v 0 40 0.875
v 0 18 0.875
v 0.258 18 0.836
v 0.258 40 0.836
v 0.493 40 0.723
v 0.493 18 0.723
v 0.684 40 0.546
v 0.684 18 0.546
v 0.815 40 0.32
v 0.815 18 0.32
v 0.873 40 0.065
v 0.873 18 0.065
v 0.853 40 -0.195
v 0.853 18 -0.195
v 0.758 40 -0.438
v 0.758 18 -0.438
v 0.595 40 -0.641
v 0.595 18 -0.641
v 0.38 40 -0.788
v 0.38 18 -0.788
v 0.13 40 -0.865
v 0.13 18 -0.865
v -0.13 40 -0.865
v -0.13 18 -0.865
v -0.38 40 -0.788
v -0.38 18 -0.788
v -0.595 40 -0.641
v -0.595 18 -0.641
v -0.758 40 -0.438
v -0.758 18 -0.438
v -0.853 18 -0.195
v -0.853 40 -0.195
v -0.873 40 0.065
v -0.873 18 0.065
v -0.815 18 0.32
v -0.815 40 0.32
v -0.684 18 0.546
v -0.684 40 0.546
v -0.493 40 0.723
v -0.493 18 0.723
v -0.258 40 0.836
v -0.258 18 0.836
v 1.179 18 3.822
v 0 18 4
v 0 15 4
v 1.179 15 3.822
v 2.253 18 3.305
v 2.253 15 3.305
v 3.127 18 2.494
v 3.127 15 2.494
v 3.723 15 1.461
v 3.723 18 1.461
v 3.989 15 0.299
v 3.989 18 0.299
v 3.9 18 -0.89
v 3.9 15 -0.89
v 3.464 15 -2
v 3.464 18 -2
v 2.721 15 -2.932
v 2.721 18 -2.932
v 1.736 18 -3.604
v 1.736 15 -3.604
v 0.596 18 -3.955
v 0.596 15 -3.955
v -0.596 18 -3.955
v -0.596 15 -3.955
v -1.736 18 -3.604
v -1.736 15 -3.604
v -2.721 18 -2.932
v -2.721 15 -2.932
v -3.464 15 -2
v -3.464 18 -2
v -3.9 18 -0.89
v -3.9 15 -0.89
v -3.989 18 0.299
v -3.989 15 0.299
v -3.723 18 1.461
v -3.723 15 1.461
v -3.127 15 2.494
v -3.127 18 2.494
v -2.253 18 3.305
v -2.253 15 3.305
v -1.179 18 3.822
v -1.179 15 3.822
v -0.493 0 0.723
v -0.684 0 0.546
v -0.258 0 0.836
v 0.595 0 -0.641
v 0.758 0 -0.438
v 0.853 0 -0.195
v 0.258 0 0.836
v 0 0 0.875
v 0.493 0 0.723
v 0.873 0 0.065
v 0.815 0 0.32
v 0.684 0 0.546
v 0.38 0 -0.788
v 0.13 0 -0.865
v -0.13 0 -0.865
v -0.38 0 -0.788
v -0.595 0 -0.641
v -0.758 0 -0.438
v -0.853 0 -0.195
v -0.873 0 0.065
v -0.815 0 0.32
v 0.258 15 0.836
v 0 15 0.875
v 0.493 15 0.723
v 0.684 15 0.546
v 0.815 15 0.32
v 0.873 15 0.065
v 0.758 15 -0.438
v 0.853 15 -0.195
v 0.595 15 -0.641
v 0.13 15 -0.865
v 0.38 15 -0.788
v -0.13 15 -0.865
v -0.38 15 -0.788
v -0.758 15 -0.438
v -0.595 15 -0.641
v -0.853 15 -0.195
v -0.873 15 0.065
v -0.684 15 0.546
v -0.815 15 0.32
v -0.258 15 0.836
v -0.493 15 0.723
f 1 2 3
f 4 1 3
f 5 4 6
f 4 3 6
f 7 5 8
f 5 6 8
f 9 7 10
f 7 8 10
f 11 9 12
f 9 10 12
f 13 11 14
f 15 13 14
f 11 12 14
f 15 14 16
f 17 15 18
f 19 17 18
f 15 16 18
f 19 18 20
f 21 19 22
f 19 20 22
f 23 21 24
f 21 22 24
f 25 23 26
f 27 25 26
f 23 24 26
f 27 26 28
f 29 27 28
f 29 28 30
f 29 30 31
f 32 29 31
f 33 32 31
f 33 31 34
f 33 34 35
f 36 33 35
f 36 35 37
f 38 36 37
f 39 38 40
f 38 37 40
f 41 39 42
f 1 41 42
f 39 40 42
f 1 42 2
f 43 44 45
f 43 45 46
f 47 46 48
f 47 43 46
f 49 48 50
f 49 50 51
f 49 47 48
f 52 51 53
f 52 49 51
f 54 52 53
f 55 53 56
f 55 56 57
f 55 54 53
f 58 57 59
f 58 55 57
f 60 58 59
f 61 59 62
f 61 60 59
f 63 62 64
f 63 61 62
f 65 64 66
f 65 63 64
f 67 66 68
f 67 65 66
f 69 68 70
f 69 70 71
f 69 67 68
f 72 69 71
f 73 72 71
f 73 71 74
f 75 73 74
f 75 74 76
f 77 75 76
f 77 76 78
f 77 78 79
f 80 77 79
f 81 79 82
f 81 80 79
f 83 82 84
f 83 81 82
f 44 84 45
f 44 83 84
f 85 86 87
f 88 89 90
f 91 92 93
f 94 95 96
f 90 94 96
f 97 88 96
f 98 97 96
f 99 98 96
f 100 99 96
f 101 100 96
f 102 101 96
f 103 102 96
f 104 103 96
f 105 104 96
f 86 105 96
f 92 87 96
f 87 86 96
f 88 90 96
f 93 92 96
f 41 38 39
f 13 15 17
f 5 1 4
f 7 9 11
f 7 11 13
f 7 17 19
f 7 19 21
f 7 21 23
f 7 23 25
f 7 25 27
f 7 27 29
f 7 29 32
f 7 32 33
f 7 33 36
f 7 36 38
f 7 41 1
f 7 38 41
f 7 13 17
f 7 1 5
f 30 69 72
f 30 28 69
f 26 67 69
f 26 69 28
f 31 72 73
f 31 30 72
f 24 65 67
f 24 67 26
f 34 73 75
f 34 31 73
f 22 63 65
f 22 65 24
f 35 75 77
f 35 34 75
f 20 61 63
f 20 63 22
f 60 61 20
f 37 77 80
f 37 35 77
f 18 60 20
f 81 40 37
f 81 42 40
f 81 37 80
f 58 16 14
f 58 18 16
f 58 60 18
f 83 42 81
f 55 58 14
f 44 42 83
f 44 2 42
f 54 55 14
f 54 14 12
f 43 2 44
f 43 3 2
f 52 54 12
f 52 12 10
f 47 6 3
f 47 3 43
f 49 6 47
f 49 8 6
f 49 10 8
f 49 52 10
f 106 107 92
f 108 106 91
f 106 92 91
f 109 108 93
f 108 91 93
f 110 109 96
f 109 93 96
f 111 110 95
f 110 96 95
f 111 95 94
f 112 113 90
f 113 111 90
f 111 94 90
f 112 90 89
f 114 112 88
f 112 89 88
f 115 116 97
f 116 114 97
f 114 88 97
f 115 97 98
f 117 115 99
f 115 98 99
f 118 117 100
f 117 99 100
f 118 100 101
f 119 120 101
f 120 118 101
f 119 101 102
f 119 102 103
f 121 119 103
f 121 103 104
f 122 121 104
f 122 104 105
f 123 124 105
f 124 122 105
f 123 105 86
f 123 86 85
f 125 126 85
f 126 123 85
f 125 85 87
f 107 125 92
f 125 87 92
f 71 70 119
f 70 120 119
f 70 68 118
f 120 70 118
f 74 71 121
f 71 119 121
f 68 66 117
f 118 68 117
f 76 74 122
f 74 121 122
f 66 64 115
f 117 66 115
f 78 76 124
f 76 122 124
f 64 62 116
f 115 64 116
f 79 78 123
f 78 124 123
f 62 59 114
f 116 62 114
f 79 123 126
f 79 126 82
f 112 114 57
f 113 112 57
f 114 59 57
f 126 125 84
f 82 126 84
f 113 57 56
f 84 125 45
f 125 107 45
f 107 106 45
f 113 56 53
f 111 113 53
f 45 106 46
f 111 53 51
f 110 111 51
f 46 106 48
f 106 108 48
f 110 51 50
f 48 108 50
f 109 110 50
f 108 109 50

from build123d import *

# Parameters (mm, degrees)
SKETCH1_R           = 0.875
BOSS_EXTRUDE2_DEPTH = 18
SKETCH3_R           = 4
BOSS_EXTRUDE3_DEPTH = 3
SKETCH4_R           = 0.875
BOSS_EXTRUDE4_DEPTH = 22


with BuildPart() as part:
    # Sketch1 → Boss-Extrude2 (new body)
    with BuildSketch(Plane(origin=(0, 0, 0), x_dir=(1, 0, 0), z_dir=(0, 1, 0))):
        with Locations(Location((0, 0, 0), (0, 0, 270))):
            Circle(SKETCH1_R)
    extrude(amount=BOSS_EXTRUDE2_DEPTH)

    # Sketch3 → Boss-Extrude3 (add)
    with BuildSketch(Plane(origin=(0, 18, 0), x_dir=(1, 0, 0), z_dir=(0, 1, 0))):
        with Locations(Location((0, 0, 0), (0, 0, 270))):
            Circle(SKETCH3_R)
    extrude(amount=-BOSS_EXTRUDE3_DEPTH)

    # Sketch4 → Boss-Extrude4 (add)
    with BuildSketch(Plane(origin=(0, 18, 0), x_dir=(1, 0, 0), z_dir=(0, 1, 0))):
        with Locations(Location((0, 0, 0), (0, 0, 270))):
            Circle(SKETCH4_R)
    extrude(amount=BOSS_EXTRUDE4_DEPTH)


solid = part.part
